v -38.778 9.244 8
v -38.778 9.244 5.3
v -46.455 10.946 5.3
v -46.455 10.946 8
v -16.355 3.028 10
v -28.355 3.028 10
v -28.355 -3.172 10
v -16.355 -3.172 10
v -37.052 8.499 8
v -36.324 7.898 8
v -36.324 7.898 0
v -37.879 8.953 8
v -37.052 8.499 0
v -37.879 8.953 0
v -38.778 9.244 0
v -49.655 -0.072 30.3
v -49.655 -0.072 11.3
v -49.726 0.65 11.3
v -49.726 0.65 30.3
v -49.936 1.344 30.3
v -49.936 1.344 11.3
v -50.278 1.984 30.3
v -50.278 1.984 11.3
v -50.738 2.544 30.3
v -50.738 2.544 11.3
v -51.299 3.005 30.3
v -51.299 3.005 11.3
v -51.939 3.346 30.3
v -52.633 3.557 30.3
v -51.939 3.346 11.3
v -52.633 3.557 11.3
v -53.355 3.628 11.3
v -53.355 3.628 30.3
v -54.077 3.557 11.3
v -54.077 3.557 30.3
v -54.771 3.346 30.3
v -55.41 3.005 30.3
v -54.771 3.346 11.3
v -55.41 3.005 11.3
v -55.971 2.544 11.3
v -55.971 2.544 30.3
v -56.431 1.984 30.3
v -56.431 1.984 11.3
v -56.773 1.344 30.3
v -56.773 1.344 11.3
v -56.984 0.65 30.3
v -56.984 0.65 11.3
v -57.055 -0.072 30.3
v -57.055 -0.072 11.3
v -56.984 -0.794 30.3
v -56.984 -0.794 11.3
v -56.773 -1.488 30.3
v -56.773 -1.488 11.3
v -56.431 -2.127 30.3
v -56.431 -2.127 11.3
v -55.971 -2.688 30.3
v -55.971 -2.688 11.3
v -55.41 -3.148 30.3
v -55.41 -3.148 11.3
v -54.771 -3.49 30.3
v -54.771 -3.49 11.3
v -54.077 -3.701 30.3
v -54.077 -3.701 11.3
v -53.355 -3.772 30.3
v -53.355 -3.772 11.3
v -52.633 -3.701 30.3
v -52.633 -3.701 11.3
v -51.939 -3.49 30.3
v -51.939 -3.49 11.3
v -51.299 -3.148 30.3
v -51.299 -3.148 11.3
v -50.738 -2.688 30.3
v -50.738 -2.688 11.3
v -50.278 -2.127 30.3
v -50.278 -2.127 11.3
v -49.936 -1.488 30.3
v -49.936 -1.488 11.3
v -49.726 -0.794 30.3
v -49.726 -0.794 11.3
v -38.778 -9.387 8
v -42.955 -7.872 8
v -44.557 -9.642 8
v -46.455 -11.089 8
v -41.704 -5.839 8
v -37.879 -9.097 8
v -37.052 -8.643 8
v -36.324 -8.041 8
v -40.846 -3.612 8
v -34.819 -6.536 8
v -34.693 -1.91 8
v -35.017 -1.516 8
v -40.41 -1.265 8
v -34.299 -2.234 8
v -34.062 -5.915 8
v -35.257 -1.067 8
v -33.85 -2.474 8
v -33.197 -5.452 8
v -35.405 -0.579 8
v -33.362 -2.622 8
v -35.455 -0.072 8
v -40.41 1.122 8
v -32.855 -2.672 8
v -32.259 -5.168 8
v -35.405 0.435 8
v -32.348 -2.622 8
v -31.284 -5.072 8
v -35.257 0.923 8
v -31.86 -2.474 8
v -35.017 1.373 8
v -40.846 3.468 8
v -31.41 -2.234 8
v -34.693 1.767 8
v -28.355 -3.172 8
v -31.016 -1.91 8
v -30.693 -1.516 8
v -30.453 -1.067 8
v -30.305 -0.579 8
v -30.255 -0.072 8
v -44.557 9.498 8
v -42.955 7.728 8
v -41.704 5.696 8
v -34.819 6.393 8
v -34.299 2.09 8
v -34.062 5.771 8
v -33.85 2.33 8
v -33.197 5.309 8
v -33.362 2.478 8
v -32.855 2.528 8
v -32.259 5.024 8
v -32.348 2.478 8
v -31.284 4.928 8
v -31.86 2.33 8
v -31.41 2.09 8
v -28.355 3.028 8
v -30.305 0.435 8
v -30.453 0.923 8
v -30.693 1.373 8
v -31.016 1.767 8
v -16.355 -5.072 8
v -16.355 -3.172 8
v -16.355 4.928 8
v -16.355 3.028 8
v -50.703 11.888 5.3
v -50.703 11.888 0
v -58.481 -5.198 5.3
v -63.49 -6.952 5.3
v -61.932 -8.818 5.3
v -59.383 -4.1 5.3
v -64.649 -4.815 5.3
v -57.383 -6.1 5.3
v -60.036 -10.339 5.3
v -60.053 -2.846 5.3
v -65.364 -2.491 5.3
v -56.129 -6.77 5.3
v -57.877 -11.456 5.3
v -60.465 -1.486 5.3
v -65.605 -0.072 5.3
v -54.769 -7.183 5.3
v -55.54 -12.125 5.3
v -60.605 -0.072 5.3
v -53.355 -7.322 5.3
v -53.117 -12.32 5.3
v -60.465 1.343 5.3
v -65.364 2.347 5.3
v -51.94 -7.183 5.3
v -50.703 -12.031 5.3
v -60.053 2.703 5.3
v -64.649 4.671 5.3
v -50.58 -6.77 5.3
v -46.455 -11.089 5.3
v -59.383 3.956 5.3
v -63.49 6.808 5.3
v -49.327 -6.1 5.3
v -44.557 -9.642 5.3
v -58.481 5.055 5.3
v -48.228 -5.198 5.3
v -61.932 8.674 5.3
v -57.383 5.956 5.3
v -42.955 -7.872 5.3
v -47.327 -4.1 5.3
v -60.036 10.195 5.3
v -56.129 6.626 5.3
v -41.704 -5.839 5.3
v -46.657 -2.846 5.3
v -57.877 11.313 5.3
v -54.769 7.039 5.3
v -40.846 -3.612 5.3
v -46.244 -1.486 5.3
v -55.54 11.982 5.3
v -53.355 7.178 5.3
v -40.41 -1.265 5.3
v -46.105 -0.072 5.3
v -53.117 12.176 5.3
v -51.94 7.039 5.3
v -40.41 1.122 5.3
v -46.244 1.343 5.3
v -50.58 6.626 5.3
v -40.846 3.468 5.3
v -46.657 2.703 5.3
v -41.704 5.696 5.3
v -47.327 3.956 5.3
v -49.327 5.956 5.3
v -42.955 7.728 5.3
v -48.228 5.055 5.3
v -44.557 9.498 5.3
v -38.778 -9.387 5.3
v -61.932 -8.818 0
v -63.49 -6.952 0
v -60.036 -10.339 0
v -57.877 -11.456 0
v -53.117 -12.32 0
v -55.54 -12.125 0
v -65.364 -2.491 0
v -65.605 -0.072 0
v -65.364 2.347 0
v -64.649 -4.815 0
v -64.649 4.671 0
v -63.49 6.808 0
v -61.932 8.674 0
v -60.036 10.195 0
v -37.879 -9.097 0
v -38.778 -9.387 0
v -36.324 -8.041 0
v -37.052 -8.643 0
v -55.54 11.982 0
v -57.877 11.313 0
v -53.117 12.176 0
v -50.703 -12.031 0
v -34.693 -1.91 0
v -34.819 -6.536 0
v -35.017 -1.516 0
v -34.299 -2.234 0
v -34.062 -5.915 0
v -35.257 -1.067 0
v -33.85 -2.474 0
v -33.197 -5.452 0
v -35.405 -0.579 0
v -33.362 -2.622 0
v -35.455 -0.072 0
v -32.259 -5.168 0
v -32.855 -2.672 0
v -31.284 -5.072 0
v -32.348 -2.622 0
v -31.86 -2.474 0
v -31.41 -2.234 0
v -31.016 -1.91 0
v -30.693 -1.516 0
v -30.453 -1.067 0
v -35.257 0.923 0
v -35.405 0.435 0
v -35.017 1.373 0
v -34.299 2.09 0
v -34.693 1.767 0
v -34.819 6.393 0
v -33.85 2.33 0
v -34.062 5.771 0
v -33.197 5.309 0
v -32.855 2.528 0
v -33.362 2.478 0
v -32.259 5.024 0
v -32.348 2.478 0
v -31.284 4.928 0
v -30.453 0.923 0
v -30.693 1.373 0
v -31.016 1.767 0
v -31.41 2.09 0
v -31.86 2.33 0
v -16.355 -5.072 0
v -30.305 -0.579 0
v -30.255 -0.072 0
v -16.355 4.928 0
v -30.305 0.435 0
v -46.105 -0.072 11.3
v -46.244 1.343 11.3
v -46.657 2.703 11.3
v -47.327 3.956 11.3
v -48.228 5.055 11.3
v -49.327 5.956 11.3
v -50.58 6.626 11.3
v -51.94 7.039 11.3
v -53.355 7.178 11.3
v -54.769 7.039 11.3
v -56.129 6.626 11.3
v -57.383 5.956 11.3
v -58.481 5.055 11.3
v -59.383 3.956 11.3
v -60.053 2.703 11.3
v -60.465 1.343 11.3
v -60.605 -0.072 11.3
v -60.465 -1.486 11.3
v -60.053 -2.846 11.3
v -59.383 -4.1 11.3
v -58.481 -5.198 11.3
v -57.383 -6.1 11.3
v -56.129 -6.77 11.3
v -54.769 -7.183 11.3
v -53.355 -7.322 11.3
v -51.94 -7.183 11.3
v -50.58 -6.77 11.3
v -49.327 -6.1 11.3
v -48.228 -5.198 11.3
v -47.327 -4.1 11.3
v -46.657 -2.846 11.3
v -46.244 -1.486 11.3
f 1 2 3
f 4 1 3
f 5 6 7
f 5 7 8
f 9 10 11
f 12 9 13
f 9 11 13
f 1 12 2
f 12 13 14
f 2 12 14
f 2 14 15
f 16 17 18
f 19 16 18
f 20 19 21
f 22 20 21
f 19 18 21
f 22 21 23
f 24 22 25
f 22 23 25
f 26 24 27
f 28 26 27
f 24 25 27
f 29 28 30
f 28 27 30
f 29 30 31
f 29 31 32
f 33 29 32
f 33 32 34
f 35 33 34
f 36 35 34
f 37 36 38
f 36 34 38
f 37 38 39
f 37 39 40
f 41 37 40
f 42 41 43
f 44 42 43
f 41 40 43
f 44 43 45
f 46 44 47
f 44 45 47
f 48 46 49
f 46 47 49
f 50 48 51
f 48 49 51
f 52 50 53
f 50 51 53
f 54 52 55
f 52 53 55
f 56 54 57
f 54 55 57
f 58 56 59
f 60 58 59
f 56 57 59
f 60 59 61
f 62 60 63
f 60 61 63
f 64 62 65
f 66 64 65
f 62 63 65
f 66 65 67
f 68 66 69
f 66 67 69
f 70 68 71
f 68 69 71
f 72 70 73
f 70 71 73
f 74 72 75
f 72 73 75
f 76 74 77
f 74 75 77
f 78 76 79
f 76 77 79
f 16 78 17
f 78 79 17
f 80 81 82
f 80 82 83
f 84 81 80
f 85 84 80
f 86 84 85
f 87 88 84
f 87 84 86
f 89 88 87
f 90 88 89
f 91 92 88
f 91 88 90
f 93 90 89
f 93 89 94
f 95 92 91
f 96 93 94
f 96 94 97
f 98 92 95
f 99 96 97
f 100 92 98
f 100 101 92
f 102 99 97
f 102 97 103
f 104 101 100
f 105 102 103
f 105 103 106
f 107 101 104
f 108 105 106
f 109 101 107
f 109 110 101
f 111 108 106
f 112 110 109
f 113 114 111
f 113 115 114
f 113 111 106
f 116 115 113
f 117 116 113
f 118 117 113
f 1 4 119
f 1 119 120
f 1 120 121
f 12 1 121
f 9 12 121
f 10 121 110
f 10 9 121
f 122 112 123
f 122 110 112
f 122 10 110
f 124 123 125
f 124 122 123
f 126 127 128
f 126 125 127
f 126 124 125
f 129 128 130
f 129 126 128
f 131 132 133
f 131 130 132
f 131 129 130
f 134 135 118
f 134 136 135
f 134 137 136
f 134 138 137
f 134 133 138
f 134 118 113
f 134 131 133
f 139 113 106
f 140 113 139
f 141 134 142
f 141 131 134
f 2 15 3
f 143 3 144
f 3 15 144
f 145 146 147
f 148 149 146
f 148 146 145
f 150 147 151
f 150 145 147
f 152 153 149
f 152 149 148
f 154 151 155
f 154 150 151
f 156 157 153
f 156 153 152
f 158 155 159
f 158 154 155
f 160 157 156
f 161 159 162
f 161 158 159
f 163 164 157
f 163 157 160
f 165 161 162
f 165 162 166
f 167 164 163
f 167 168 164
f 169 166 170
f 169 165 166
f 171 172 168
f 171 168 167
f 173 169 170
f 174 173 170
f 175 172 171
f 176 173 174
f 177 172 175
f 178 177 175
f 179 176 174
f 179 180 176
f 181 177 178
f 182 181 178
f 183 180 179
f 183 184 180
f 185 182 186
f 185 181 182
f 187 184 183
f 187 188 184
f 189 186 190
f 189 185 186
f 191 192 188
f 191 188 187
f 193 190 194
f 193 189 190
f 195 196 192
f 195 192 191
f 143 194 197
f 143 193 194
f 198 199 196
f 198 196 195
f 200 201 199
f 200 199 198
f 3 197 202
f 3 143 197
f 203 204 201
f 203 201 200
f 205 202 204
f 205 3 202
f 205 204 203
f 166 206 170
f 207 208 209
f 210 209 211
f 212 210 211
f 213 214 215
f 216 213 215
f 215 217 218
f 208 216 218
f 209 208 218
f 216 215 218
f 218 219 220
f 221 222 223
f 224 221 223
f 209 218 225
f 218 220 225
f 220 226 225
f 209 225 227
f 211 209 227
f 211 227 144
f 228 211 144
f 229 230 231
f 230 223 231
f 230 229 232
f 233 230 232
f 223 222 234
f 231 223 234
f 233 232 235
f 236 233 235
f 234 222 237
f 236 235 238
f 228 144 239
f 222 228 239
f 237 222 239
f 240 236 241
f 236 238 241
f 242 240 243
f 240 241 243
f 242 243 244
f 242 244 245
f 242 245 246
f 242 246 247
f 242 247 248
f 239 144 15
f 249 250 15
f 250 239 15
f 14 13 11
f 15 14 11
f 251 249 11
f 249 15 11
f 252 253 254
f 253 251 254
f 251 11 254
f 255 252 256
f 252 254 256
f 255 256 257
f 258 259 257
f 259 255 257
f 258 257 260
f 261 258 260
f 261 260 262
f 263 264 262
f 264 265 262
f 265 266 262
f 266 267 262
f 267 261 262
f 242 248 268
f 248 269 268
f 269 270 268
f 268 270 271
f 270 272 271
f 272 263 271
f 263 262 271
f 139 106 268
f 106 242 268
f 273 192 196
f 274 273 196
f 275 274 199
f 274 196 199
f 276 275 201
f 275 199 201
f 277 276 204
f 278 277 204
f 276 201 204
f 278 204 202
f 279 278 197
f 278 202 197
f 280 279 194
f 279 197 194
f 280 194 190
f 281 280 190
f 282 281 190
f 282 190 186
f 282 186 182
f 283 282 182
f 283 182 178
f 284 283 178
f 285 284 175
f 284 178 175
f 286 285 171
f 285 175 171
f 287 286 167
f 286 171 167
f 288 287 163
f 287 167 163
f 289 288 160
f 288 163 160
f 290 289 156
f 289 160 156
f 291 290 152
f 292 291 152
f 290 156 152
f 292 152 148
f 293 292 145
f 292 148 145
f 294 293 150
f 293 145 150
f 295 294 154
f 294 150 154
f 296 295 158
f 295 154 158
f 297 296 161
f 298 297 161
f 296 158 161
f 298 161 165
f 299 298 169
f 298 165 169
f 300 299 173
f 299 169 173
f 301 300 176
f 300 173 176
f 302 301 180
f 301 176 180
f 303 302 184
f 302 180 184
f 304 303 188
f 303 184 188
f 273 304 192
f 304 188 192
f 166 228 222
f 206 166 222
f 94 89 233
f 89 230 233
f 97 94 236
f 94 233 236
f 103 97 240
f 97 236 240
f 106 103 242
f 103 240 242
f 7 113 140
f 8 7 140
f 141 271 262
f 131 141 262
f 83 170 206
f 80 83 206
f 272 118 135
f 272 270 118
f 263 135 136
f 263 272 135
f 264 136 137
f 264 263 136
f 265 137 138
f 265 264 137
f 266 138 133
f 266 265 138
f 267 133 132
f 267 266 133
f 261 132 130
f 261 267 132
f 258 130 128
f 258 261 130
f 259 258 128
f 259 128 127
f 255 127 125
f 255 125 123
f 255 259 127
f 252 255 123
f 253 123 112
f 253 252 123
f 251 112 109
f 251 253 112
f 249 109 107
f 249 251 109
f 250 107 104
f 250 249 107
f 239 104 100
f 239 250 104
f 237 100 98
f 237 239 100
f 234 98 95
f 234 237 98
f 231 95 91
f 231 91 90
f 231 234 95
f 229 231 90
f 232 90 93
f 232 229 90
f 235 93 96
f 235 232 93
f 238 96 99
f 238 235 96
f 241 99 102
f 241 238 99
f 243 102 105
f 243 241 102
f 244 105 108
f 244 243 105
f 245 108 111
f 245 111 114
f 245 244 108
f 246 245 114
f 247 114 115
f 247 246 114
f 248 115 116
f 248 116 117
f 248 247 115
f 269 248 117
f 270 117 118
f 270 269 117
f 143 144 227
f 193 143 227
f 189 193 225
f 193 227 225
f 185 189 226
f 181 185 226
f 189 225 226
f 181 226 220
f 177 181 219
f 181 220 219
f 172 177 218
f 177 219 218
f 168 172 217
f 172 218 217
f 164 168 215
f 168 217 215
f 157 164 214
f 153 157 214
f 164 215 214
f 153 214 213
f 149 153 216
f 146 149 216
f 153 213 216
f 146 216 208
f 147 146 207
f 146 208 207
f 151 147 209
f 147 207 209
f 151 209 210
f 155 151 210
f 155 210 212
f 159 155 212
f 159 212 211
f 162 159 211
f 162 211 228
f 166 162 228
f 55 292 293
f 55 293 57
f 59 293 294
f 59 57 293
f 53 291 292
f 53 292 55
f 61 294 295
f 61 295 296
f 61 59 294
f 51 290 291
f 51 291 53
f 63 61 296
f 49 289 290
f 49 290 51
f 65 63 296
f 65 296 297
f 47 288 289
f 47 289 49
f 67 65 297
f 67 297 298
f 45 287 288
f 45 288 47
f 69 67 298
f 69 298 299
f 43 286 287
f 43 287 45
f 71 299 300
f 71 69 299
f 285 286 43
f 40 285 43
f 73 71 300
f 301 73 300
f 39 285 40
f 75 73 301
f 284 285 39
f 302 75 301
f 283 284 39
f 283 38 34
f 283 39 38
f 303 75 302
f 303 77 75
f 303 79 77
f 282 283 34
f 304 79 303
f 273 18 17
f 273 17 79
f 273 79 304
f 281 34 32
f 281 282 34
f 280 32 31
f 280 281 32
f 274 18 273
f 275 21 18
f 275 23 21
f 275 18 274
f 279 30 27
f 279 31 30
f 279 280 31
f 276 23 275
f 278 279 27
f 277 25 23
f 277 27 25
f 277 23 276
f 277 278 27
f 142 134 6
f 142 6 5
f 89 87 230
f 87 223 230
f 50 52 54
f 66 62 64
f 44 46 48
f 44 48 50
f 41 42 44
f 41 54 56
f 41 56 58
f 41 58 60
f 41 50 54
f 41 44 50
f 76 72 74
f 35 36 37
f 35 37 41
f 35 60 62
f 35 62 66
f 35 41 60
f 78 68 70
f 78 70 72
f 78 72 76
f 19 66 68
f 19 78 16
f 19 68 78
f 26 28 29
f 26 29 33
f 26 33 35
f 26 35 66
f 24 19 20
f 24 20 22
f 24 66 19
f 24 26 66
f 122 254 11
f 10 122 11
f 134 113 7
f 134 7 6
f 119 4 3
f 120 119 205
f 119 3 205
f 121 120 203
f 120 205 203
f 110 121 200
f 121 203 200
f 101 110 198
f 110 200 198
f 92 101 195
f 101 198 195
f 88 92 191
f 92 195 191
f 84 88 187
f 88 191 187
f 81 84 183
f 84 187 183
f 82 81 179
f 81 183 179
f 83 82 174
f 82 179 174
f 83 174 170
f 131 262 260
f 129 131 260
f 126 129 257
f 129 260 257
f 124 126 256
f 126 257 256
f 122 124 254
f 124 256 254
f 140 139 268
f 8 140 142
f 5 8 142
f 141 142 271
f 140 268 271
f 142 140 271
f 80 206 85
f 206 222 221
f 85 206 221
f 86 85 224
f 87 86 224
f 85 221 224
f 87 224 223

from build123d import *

# Parameters (mm, degrees)
F0_R     = 2.6
F1_DEPTH = 5.3
F2_R     = 7.25
F3_DEPTH = 6
F2_R_2   = 2.6
F4_DEPTH = 2.7
F5_W     = 12
F5_H     = 6.2
F6_DEPTH = 2
F7_R     = 3.7
F8_DEPTH = 19


with BuildPart() as f1:
    # F0 (on Top) → F1 (new body)
    with BuildSketch(Plane.XY):
        with BuildLine():
            Line((-16.354793, -5.071878), (-16.354793, -0.071878))
            Line((-16.354793, -0.071878), (-16.354793, 4.928122))
            Line((-16.354793, 4.928122), (-31.283726, 4.928122))
            ThreePointArc((-31.283726, 4.928122), (-33.197143, 5.308724), (-34.819259, 6.392588))
            Line((-34.819259, 6.392588), (-36.324322, 7.89765))
            ThreePointArc((-36.324322, 7.89765), (-37.454863, 8.745723), (-38.77755, 9.243572))
            Line((-38.77755, 9.243572), (-50.703144, 11.887689))
            ThreePointArc((-50.703144, 11.887689), (-65.604793, -0.071878), (-50.703144, -12.031446))
            Line((-50.703144, -12.031446), (-38.77755, -9.387329))
            ThreePointArc((-38.77755, -9.387329), (-37.454863, -8.88948), (-36.324322, -8.041406))
            Line((-36.324322, -8.041406), (-34.819259, -6.536344))
            ThreePointArc((-34.819259, -6.536344), (-33.197143, -5.45248), (-31.283726, -5.071878))
            Line((-31.283726, -5.071878), (-16.354793, -5.071878))
        make_face()
        with Locations((-32.854793, -0.071878)):
            Circle(F0_R, mode=Mode.SUBTRACT)
    extrude(amount=F1_DEPTH)

    # F2 (on face) → F3 (join)
    with BuildSketch(Plane.XY.offset(5.3)):
        with Locations((-53.354793, -0.071878)):
            Circle(F2_R)
    extrude(amount=F3_DEPTH)

    # F2 (on face) → F4 (join)
    with BuildSketch(Plane.XY.offset(5.3)):
        with BuildLine():
            ThreePointArc((-46.454594, 10.94571), (-40.354793, -0.071878), (-46.454594, -11.089466))
            Line((-46.454594, -11.089466), (-38.77755, -9.387329))
            ThreePointArc((-38.77755, -9.387329), (-37.454863, -8.88948), (-36.324322, -8.041406))
            Line((-36.324322, -8.041406), (-34.819259, -6.536344))
            ThreePointArc((-34.819259, -6.536344), (-33.197143, -5.45248), (-31.283726, -5.071878))
            Line((-31.283726, -5.071878), (-16.354793, -5.071878))
            Line((-16.354793, -5.071878), (-16.354793, -0.071878))
            Line((-16.354793, -0.071878), (-16.354793, 4.928122))
            Line((-16.354793, 4.928122), (-31.283726, 4.928122))
            ThreePointArc((-31.283726, 4.928122), (-33.197143, 5.308724), (-34.819259, 6.392588))
            Line((-34.819259, 6.392588), (-36.324322, 7.89765))
            ThreePointArc((-36.324322, 7.89765), (-37.454863, 8.745723), (-38.77755, 9.243572))
            Line((-38.77755, 9.243572), (-46.454594, 10.94571))
        make_face()
        with Locations((-32.854793, -0.071878)):
            Circle(F2_R_2, mode=Mode.SUBTRACT)
    extrude(amount=F4_DEPTH)

    # F5 (on face) → F6 (join)
    with BuildSketch(Plane.XY.offset(8)):
        with Locations((-22.354793, -0.071878)):
            Rectangle(F5_W, F5_H)
    extrude(amount=F6_DEPTH)

    # F7 (on face) → F8 (join)
    with BuildSketch(Plane.XY.offset(11.3)):
        with Locations((-53.354793, -0.071878)):
            Circle(F7_R)
    extrude(amount=F8_DEPTH)


solid = f1.part
